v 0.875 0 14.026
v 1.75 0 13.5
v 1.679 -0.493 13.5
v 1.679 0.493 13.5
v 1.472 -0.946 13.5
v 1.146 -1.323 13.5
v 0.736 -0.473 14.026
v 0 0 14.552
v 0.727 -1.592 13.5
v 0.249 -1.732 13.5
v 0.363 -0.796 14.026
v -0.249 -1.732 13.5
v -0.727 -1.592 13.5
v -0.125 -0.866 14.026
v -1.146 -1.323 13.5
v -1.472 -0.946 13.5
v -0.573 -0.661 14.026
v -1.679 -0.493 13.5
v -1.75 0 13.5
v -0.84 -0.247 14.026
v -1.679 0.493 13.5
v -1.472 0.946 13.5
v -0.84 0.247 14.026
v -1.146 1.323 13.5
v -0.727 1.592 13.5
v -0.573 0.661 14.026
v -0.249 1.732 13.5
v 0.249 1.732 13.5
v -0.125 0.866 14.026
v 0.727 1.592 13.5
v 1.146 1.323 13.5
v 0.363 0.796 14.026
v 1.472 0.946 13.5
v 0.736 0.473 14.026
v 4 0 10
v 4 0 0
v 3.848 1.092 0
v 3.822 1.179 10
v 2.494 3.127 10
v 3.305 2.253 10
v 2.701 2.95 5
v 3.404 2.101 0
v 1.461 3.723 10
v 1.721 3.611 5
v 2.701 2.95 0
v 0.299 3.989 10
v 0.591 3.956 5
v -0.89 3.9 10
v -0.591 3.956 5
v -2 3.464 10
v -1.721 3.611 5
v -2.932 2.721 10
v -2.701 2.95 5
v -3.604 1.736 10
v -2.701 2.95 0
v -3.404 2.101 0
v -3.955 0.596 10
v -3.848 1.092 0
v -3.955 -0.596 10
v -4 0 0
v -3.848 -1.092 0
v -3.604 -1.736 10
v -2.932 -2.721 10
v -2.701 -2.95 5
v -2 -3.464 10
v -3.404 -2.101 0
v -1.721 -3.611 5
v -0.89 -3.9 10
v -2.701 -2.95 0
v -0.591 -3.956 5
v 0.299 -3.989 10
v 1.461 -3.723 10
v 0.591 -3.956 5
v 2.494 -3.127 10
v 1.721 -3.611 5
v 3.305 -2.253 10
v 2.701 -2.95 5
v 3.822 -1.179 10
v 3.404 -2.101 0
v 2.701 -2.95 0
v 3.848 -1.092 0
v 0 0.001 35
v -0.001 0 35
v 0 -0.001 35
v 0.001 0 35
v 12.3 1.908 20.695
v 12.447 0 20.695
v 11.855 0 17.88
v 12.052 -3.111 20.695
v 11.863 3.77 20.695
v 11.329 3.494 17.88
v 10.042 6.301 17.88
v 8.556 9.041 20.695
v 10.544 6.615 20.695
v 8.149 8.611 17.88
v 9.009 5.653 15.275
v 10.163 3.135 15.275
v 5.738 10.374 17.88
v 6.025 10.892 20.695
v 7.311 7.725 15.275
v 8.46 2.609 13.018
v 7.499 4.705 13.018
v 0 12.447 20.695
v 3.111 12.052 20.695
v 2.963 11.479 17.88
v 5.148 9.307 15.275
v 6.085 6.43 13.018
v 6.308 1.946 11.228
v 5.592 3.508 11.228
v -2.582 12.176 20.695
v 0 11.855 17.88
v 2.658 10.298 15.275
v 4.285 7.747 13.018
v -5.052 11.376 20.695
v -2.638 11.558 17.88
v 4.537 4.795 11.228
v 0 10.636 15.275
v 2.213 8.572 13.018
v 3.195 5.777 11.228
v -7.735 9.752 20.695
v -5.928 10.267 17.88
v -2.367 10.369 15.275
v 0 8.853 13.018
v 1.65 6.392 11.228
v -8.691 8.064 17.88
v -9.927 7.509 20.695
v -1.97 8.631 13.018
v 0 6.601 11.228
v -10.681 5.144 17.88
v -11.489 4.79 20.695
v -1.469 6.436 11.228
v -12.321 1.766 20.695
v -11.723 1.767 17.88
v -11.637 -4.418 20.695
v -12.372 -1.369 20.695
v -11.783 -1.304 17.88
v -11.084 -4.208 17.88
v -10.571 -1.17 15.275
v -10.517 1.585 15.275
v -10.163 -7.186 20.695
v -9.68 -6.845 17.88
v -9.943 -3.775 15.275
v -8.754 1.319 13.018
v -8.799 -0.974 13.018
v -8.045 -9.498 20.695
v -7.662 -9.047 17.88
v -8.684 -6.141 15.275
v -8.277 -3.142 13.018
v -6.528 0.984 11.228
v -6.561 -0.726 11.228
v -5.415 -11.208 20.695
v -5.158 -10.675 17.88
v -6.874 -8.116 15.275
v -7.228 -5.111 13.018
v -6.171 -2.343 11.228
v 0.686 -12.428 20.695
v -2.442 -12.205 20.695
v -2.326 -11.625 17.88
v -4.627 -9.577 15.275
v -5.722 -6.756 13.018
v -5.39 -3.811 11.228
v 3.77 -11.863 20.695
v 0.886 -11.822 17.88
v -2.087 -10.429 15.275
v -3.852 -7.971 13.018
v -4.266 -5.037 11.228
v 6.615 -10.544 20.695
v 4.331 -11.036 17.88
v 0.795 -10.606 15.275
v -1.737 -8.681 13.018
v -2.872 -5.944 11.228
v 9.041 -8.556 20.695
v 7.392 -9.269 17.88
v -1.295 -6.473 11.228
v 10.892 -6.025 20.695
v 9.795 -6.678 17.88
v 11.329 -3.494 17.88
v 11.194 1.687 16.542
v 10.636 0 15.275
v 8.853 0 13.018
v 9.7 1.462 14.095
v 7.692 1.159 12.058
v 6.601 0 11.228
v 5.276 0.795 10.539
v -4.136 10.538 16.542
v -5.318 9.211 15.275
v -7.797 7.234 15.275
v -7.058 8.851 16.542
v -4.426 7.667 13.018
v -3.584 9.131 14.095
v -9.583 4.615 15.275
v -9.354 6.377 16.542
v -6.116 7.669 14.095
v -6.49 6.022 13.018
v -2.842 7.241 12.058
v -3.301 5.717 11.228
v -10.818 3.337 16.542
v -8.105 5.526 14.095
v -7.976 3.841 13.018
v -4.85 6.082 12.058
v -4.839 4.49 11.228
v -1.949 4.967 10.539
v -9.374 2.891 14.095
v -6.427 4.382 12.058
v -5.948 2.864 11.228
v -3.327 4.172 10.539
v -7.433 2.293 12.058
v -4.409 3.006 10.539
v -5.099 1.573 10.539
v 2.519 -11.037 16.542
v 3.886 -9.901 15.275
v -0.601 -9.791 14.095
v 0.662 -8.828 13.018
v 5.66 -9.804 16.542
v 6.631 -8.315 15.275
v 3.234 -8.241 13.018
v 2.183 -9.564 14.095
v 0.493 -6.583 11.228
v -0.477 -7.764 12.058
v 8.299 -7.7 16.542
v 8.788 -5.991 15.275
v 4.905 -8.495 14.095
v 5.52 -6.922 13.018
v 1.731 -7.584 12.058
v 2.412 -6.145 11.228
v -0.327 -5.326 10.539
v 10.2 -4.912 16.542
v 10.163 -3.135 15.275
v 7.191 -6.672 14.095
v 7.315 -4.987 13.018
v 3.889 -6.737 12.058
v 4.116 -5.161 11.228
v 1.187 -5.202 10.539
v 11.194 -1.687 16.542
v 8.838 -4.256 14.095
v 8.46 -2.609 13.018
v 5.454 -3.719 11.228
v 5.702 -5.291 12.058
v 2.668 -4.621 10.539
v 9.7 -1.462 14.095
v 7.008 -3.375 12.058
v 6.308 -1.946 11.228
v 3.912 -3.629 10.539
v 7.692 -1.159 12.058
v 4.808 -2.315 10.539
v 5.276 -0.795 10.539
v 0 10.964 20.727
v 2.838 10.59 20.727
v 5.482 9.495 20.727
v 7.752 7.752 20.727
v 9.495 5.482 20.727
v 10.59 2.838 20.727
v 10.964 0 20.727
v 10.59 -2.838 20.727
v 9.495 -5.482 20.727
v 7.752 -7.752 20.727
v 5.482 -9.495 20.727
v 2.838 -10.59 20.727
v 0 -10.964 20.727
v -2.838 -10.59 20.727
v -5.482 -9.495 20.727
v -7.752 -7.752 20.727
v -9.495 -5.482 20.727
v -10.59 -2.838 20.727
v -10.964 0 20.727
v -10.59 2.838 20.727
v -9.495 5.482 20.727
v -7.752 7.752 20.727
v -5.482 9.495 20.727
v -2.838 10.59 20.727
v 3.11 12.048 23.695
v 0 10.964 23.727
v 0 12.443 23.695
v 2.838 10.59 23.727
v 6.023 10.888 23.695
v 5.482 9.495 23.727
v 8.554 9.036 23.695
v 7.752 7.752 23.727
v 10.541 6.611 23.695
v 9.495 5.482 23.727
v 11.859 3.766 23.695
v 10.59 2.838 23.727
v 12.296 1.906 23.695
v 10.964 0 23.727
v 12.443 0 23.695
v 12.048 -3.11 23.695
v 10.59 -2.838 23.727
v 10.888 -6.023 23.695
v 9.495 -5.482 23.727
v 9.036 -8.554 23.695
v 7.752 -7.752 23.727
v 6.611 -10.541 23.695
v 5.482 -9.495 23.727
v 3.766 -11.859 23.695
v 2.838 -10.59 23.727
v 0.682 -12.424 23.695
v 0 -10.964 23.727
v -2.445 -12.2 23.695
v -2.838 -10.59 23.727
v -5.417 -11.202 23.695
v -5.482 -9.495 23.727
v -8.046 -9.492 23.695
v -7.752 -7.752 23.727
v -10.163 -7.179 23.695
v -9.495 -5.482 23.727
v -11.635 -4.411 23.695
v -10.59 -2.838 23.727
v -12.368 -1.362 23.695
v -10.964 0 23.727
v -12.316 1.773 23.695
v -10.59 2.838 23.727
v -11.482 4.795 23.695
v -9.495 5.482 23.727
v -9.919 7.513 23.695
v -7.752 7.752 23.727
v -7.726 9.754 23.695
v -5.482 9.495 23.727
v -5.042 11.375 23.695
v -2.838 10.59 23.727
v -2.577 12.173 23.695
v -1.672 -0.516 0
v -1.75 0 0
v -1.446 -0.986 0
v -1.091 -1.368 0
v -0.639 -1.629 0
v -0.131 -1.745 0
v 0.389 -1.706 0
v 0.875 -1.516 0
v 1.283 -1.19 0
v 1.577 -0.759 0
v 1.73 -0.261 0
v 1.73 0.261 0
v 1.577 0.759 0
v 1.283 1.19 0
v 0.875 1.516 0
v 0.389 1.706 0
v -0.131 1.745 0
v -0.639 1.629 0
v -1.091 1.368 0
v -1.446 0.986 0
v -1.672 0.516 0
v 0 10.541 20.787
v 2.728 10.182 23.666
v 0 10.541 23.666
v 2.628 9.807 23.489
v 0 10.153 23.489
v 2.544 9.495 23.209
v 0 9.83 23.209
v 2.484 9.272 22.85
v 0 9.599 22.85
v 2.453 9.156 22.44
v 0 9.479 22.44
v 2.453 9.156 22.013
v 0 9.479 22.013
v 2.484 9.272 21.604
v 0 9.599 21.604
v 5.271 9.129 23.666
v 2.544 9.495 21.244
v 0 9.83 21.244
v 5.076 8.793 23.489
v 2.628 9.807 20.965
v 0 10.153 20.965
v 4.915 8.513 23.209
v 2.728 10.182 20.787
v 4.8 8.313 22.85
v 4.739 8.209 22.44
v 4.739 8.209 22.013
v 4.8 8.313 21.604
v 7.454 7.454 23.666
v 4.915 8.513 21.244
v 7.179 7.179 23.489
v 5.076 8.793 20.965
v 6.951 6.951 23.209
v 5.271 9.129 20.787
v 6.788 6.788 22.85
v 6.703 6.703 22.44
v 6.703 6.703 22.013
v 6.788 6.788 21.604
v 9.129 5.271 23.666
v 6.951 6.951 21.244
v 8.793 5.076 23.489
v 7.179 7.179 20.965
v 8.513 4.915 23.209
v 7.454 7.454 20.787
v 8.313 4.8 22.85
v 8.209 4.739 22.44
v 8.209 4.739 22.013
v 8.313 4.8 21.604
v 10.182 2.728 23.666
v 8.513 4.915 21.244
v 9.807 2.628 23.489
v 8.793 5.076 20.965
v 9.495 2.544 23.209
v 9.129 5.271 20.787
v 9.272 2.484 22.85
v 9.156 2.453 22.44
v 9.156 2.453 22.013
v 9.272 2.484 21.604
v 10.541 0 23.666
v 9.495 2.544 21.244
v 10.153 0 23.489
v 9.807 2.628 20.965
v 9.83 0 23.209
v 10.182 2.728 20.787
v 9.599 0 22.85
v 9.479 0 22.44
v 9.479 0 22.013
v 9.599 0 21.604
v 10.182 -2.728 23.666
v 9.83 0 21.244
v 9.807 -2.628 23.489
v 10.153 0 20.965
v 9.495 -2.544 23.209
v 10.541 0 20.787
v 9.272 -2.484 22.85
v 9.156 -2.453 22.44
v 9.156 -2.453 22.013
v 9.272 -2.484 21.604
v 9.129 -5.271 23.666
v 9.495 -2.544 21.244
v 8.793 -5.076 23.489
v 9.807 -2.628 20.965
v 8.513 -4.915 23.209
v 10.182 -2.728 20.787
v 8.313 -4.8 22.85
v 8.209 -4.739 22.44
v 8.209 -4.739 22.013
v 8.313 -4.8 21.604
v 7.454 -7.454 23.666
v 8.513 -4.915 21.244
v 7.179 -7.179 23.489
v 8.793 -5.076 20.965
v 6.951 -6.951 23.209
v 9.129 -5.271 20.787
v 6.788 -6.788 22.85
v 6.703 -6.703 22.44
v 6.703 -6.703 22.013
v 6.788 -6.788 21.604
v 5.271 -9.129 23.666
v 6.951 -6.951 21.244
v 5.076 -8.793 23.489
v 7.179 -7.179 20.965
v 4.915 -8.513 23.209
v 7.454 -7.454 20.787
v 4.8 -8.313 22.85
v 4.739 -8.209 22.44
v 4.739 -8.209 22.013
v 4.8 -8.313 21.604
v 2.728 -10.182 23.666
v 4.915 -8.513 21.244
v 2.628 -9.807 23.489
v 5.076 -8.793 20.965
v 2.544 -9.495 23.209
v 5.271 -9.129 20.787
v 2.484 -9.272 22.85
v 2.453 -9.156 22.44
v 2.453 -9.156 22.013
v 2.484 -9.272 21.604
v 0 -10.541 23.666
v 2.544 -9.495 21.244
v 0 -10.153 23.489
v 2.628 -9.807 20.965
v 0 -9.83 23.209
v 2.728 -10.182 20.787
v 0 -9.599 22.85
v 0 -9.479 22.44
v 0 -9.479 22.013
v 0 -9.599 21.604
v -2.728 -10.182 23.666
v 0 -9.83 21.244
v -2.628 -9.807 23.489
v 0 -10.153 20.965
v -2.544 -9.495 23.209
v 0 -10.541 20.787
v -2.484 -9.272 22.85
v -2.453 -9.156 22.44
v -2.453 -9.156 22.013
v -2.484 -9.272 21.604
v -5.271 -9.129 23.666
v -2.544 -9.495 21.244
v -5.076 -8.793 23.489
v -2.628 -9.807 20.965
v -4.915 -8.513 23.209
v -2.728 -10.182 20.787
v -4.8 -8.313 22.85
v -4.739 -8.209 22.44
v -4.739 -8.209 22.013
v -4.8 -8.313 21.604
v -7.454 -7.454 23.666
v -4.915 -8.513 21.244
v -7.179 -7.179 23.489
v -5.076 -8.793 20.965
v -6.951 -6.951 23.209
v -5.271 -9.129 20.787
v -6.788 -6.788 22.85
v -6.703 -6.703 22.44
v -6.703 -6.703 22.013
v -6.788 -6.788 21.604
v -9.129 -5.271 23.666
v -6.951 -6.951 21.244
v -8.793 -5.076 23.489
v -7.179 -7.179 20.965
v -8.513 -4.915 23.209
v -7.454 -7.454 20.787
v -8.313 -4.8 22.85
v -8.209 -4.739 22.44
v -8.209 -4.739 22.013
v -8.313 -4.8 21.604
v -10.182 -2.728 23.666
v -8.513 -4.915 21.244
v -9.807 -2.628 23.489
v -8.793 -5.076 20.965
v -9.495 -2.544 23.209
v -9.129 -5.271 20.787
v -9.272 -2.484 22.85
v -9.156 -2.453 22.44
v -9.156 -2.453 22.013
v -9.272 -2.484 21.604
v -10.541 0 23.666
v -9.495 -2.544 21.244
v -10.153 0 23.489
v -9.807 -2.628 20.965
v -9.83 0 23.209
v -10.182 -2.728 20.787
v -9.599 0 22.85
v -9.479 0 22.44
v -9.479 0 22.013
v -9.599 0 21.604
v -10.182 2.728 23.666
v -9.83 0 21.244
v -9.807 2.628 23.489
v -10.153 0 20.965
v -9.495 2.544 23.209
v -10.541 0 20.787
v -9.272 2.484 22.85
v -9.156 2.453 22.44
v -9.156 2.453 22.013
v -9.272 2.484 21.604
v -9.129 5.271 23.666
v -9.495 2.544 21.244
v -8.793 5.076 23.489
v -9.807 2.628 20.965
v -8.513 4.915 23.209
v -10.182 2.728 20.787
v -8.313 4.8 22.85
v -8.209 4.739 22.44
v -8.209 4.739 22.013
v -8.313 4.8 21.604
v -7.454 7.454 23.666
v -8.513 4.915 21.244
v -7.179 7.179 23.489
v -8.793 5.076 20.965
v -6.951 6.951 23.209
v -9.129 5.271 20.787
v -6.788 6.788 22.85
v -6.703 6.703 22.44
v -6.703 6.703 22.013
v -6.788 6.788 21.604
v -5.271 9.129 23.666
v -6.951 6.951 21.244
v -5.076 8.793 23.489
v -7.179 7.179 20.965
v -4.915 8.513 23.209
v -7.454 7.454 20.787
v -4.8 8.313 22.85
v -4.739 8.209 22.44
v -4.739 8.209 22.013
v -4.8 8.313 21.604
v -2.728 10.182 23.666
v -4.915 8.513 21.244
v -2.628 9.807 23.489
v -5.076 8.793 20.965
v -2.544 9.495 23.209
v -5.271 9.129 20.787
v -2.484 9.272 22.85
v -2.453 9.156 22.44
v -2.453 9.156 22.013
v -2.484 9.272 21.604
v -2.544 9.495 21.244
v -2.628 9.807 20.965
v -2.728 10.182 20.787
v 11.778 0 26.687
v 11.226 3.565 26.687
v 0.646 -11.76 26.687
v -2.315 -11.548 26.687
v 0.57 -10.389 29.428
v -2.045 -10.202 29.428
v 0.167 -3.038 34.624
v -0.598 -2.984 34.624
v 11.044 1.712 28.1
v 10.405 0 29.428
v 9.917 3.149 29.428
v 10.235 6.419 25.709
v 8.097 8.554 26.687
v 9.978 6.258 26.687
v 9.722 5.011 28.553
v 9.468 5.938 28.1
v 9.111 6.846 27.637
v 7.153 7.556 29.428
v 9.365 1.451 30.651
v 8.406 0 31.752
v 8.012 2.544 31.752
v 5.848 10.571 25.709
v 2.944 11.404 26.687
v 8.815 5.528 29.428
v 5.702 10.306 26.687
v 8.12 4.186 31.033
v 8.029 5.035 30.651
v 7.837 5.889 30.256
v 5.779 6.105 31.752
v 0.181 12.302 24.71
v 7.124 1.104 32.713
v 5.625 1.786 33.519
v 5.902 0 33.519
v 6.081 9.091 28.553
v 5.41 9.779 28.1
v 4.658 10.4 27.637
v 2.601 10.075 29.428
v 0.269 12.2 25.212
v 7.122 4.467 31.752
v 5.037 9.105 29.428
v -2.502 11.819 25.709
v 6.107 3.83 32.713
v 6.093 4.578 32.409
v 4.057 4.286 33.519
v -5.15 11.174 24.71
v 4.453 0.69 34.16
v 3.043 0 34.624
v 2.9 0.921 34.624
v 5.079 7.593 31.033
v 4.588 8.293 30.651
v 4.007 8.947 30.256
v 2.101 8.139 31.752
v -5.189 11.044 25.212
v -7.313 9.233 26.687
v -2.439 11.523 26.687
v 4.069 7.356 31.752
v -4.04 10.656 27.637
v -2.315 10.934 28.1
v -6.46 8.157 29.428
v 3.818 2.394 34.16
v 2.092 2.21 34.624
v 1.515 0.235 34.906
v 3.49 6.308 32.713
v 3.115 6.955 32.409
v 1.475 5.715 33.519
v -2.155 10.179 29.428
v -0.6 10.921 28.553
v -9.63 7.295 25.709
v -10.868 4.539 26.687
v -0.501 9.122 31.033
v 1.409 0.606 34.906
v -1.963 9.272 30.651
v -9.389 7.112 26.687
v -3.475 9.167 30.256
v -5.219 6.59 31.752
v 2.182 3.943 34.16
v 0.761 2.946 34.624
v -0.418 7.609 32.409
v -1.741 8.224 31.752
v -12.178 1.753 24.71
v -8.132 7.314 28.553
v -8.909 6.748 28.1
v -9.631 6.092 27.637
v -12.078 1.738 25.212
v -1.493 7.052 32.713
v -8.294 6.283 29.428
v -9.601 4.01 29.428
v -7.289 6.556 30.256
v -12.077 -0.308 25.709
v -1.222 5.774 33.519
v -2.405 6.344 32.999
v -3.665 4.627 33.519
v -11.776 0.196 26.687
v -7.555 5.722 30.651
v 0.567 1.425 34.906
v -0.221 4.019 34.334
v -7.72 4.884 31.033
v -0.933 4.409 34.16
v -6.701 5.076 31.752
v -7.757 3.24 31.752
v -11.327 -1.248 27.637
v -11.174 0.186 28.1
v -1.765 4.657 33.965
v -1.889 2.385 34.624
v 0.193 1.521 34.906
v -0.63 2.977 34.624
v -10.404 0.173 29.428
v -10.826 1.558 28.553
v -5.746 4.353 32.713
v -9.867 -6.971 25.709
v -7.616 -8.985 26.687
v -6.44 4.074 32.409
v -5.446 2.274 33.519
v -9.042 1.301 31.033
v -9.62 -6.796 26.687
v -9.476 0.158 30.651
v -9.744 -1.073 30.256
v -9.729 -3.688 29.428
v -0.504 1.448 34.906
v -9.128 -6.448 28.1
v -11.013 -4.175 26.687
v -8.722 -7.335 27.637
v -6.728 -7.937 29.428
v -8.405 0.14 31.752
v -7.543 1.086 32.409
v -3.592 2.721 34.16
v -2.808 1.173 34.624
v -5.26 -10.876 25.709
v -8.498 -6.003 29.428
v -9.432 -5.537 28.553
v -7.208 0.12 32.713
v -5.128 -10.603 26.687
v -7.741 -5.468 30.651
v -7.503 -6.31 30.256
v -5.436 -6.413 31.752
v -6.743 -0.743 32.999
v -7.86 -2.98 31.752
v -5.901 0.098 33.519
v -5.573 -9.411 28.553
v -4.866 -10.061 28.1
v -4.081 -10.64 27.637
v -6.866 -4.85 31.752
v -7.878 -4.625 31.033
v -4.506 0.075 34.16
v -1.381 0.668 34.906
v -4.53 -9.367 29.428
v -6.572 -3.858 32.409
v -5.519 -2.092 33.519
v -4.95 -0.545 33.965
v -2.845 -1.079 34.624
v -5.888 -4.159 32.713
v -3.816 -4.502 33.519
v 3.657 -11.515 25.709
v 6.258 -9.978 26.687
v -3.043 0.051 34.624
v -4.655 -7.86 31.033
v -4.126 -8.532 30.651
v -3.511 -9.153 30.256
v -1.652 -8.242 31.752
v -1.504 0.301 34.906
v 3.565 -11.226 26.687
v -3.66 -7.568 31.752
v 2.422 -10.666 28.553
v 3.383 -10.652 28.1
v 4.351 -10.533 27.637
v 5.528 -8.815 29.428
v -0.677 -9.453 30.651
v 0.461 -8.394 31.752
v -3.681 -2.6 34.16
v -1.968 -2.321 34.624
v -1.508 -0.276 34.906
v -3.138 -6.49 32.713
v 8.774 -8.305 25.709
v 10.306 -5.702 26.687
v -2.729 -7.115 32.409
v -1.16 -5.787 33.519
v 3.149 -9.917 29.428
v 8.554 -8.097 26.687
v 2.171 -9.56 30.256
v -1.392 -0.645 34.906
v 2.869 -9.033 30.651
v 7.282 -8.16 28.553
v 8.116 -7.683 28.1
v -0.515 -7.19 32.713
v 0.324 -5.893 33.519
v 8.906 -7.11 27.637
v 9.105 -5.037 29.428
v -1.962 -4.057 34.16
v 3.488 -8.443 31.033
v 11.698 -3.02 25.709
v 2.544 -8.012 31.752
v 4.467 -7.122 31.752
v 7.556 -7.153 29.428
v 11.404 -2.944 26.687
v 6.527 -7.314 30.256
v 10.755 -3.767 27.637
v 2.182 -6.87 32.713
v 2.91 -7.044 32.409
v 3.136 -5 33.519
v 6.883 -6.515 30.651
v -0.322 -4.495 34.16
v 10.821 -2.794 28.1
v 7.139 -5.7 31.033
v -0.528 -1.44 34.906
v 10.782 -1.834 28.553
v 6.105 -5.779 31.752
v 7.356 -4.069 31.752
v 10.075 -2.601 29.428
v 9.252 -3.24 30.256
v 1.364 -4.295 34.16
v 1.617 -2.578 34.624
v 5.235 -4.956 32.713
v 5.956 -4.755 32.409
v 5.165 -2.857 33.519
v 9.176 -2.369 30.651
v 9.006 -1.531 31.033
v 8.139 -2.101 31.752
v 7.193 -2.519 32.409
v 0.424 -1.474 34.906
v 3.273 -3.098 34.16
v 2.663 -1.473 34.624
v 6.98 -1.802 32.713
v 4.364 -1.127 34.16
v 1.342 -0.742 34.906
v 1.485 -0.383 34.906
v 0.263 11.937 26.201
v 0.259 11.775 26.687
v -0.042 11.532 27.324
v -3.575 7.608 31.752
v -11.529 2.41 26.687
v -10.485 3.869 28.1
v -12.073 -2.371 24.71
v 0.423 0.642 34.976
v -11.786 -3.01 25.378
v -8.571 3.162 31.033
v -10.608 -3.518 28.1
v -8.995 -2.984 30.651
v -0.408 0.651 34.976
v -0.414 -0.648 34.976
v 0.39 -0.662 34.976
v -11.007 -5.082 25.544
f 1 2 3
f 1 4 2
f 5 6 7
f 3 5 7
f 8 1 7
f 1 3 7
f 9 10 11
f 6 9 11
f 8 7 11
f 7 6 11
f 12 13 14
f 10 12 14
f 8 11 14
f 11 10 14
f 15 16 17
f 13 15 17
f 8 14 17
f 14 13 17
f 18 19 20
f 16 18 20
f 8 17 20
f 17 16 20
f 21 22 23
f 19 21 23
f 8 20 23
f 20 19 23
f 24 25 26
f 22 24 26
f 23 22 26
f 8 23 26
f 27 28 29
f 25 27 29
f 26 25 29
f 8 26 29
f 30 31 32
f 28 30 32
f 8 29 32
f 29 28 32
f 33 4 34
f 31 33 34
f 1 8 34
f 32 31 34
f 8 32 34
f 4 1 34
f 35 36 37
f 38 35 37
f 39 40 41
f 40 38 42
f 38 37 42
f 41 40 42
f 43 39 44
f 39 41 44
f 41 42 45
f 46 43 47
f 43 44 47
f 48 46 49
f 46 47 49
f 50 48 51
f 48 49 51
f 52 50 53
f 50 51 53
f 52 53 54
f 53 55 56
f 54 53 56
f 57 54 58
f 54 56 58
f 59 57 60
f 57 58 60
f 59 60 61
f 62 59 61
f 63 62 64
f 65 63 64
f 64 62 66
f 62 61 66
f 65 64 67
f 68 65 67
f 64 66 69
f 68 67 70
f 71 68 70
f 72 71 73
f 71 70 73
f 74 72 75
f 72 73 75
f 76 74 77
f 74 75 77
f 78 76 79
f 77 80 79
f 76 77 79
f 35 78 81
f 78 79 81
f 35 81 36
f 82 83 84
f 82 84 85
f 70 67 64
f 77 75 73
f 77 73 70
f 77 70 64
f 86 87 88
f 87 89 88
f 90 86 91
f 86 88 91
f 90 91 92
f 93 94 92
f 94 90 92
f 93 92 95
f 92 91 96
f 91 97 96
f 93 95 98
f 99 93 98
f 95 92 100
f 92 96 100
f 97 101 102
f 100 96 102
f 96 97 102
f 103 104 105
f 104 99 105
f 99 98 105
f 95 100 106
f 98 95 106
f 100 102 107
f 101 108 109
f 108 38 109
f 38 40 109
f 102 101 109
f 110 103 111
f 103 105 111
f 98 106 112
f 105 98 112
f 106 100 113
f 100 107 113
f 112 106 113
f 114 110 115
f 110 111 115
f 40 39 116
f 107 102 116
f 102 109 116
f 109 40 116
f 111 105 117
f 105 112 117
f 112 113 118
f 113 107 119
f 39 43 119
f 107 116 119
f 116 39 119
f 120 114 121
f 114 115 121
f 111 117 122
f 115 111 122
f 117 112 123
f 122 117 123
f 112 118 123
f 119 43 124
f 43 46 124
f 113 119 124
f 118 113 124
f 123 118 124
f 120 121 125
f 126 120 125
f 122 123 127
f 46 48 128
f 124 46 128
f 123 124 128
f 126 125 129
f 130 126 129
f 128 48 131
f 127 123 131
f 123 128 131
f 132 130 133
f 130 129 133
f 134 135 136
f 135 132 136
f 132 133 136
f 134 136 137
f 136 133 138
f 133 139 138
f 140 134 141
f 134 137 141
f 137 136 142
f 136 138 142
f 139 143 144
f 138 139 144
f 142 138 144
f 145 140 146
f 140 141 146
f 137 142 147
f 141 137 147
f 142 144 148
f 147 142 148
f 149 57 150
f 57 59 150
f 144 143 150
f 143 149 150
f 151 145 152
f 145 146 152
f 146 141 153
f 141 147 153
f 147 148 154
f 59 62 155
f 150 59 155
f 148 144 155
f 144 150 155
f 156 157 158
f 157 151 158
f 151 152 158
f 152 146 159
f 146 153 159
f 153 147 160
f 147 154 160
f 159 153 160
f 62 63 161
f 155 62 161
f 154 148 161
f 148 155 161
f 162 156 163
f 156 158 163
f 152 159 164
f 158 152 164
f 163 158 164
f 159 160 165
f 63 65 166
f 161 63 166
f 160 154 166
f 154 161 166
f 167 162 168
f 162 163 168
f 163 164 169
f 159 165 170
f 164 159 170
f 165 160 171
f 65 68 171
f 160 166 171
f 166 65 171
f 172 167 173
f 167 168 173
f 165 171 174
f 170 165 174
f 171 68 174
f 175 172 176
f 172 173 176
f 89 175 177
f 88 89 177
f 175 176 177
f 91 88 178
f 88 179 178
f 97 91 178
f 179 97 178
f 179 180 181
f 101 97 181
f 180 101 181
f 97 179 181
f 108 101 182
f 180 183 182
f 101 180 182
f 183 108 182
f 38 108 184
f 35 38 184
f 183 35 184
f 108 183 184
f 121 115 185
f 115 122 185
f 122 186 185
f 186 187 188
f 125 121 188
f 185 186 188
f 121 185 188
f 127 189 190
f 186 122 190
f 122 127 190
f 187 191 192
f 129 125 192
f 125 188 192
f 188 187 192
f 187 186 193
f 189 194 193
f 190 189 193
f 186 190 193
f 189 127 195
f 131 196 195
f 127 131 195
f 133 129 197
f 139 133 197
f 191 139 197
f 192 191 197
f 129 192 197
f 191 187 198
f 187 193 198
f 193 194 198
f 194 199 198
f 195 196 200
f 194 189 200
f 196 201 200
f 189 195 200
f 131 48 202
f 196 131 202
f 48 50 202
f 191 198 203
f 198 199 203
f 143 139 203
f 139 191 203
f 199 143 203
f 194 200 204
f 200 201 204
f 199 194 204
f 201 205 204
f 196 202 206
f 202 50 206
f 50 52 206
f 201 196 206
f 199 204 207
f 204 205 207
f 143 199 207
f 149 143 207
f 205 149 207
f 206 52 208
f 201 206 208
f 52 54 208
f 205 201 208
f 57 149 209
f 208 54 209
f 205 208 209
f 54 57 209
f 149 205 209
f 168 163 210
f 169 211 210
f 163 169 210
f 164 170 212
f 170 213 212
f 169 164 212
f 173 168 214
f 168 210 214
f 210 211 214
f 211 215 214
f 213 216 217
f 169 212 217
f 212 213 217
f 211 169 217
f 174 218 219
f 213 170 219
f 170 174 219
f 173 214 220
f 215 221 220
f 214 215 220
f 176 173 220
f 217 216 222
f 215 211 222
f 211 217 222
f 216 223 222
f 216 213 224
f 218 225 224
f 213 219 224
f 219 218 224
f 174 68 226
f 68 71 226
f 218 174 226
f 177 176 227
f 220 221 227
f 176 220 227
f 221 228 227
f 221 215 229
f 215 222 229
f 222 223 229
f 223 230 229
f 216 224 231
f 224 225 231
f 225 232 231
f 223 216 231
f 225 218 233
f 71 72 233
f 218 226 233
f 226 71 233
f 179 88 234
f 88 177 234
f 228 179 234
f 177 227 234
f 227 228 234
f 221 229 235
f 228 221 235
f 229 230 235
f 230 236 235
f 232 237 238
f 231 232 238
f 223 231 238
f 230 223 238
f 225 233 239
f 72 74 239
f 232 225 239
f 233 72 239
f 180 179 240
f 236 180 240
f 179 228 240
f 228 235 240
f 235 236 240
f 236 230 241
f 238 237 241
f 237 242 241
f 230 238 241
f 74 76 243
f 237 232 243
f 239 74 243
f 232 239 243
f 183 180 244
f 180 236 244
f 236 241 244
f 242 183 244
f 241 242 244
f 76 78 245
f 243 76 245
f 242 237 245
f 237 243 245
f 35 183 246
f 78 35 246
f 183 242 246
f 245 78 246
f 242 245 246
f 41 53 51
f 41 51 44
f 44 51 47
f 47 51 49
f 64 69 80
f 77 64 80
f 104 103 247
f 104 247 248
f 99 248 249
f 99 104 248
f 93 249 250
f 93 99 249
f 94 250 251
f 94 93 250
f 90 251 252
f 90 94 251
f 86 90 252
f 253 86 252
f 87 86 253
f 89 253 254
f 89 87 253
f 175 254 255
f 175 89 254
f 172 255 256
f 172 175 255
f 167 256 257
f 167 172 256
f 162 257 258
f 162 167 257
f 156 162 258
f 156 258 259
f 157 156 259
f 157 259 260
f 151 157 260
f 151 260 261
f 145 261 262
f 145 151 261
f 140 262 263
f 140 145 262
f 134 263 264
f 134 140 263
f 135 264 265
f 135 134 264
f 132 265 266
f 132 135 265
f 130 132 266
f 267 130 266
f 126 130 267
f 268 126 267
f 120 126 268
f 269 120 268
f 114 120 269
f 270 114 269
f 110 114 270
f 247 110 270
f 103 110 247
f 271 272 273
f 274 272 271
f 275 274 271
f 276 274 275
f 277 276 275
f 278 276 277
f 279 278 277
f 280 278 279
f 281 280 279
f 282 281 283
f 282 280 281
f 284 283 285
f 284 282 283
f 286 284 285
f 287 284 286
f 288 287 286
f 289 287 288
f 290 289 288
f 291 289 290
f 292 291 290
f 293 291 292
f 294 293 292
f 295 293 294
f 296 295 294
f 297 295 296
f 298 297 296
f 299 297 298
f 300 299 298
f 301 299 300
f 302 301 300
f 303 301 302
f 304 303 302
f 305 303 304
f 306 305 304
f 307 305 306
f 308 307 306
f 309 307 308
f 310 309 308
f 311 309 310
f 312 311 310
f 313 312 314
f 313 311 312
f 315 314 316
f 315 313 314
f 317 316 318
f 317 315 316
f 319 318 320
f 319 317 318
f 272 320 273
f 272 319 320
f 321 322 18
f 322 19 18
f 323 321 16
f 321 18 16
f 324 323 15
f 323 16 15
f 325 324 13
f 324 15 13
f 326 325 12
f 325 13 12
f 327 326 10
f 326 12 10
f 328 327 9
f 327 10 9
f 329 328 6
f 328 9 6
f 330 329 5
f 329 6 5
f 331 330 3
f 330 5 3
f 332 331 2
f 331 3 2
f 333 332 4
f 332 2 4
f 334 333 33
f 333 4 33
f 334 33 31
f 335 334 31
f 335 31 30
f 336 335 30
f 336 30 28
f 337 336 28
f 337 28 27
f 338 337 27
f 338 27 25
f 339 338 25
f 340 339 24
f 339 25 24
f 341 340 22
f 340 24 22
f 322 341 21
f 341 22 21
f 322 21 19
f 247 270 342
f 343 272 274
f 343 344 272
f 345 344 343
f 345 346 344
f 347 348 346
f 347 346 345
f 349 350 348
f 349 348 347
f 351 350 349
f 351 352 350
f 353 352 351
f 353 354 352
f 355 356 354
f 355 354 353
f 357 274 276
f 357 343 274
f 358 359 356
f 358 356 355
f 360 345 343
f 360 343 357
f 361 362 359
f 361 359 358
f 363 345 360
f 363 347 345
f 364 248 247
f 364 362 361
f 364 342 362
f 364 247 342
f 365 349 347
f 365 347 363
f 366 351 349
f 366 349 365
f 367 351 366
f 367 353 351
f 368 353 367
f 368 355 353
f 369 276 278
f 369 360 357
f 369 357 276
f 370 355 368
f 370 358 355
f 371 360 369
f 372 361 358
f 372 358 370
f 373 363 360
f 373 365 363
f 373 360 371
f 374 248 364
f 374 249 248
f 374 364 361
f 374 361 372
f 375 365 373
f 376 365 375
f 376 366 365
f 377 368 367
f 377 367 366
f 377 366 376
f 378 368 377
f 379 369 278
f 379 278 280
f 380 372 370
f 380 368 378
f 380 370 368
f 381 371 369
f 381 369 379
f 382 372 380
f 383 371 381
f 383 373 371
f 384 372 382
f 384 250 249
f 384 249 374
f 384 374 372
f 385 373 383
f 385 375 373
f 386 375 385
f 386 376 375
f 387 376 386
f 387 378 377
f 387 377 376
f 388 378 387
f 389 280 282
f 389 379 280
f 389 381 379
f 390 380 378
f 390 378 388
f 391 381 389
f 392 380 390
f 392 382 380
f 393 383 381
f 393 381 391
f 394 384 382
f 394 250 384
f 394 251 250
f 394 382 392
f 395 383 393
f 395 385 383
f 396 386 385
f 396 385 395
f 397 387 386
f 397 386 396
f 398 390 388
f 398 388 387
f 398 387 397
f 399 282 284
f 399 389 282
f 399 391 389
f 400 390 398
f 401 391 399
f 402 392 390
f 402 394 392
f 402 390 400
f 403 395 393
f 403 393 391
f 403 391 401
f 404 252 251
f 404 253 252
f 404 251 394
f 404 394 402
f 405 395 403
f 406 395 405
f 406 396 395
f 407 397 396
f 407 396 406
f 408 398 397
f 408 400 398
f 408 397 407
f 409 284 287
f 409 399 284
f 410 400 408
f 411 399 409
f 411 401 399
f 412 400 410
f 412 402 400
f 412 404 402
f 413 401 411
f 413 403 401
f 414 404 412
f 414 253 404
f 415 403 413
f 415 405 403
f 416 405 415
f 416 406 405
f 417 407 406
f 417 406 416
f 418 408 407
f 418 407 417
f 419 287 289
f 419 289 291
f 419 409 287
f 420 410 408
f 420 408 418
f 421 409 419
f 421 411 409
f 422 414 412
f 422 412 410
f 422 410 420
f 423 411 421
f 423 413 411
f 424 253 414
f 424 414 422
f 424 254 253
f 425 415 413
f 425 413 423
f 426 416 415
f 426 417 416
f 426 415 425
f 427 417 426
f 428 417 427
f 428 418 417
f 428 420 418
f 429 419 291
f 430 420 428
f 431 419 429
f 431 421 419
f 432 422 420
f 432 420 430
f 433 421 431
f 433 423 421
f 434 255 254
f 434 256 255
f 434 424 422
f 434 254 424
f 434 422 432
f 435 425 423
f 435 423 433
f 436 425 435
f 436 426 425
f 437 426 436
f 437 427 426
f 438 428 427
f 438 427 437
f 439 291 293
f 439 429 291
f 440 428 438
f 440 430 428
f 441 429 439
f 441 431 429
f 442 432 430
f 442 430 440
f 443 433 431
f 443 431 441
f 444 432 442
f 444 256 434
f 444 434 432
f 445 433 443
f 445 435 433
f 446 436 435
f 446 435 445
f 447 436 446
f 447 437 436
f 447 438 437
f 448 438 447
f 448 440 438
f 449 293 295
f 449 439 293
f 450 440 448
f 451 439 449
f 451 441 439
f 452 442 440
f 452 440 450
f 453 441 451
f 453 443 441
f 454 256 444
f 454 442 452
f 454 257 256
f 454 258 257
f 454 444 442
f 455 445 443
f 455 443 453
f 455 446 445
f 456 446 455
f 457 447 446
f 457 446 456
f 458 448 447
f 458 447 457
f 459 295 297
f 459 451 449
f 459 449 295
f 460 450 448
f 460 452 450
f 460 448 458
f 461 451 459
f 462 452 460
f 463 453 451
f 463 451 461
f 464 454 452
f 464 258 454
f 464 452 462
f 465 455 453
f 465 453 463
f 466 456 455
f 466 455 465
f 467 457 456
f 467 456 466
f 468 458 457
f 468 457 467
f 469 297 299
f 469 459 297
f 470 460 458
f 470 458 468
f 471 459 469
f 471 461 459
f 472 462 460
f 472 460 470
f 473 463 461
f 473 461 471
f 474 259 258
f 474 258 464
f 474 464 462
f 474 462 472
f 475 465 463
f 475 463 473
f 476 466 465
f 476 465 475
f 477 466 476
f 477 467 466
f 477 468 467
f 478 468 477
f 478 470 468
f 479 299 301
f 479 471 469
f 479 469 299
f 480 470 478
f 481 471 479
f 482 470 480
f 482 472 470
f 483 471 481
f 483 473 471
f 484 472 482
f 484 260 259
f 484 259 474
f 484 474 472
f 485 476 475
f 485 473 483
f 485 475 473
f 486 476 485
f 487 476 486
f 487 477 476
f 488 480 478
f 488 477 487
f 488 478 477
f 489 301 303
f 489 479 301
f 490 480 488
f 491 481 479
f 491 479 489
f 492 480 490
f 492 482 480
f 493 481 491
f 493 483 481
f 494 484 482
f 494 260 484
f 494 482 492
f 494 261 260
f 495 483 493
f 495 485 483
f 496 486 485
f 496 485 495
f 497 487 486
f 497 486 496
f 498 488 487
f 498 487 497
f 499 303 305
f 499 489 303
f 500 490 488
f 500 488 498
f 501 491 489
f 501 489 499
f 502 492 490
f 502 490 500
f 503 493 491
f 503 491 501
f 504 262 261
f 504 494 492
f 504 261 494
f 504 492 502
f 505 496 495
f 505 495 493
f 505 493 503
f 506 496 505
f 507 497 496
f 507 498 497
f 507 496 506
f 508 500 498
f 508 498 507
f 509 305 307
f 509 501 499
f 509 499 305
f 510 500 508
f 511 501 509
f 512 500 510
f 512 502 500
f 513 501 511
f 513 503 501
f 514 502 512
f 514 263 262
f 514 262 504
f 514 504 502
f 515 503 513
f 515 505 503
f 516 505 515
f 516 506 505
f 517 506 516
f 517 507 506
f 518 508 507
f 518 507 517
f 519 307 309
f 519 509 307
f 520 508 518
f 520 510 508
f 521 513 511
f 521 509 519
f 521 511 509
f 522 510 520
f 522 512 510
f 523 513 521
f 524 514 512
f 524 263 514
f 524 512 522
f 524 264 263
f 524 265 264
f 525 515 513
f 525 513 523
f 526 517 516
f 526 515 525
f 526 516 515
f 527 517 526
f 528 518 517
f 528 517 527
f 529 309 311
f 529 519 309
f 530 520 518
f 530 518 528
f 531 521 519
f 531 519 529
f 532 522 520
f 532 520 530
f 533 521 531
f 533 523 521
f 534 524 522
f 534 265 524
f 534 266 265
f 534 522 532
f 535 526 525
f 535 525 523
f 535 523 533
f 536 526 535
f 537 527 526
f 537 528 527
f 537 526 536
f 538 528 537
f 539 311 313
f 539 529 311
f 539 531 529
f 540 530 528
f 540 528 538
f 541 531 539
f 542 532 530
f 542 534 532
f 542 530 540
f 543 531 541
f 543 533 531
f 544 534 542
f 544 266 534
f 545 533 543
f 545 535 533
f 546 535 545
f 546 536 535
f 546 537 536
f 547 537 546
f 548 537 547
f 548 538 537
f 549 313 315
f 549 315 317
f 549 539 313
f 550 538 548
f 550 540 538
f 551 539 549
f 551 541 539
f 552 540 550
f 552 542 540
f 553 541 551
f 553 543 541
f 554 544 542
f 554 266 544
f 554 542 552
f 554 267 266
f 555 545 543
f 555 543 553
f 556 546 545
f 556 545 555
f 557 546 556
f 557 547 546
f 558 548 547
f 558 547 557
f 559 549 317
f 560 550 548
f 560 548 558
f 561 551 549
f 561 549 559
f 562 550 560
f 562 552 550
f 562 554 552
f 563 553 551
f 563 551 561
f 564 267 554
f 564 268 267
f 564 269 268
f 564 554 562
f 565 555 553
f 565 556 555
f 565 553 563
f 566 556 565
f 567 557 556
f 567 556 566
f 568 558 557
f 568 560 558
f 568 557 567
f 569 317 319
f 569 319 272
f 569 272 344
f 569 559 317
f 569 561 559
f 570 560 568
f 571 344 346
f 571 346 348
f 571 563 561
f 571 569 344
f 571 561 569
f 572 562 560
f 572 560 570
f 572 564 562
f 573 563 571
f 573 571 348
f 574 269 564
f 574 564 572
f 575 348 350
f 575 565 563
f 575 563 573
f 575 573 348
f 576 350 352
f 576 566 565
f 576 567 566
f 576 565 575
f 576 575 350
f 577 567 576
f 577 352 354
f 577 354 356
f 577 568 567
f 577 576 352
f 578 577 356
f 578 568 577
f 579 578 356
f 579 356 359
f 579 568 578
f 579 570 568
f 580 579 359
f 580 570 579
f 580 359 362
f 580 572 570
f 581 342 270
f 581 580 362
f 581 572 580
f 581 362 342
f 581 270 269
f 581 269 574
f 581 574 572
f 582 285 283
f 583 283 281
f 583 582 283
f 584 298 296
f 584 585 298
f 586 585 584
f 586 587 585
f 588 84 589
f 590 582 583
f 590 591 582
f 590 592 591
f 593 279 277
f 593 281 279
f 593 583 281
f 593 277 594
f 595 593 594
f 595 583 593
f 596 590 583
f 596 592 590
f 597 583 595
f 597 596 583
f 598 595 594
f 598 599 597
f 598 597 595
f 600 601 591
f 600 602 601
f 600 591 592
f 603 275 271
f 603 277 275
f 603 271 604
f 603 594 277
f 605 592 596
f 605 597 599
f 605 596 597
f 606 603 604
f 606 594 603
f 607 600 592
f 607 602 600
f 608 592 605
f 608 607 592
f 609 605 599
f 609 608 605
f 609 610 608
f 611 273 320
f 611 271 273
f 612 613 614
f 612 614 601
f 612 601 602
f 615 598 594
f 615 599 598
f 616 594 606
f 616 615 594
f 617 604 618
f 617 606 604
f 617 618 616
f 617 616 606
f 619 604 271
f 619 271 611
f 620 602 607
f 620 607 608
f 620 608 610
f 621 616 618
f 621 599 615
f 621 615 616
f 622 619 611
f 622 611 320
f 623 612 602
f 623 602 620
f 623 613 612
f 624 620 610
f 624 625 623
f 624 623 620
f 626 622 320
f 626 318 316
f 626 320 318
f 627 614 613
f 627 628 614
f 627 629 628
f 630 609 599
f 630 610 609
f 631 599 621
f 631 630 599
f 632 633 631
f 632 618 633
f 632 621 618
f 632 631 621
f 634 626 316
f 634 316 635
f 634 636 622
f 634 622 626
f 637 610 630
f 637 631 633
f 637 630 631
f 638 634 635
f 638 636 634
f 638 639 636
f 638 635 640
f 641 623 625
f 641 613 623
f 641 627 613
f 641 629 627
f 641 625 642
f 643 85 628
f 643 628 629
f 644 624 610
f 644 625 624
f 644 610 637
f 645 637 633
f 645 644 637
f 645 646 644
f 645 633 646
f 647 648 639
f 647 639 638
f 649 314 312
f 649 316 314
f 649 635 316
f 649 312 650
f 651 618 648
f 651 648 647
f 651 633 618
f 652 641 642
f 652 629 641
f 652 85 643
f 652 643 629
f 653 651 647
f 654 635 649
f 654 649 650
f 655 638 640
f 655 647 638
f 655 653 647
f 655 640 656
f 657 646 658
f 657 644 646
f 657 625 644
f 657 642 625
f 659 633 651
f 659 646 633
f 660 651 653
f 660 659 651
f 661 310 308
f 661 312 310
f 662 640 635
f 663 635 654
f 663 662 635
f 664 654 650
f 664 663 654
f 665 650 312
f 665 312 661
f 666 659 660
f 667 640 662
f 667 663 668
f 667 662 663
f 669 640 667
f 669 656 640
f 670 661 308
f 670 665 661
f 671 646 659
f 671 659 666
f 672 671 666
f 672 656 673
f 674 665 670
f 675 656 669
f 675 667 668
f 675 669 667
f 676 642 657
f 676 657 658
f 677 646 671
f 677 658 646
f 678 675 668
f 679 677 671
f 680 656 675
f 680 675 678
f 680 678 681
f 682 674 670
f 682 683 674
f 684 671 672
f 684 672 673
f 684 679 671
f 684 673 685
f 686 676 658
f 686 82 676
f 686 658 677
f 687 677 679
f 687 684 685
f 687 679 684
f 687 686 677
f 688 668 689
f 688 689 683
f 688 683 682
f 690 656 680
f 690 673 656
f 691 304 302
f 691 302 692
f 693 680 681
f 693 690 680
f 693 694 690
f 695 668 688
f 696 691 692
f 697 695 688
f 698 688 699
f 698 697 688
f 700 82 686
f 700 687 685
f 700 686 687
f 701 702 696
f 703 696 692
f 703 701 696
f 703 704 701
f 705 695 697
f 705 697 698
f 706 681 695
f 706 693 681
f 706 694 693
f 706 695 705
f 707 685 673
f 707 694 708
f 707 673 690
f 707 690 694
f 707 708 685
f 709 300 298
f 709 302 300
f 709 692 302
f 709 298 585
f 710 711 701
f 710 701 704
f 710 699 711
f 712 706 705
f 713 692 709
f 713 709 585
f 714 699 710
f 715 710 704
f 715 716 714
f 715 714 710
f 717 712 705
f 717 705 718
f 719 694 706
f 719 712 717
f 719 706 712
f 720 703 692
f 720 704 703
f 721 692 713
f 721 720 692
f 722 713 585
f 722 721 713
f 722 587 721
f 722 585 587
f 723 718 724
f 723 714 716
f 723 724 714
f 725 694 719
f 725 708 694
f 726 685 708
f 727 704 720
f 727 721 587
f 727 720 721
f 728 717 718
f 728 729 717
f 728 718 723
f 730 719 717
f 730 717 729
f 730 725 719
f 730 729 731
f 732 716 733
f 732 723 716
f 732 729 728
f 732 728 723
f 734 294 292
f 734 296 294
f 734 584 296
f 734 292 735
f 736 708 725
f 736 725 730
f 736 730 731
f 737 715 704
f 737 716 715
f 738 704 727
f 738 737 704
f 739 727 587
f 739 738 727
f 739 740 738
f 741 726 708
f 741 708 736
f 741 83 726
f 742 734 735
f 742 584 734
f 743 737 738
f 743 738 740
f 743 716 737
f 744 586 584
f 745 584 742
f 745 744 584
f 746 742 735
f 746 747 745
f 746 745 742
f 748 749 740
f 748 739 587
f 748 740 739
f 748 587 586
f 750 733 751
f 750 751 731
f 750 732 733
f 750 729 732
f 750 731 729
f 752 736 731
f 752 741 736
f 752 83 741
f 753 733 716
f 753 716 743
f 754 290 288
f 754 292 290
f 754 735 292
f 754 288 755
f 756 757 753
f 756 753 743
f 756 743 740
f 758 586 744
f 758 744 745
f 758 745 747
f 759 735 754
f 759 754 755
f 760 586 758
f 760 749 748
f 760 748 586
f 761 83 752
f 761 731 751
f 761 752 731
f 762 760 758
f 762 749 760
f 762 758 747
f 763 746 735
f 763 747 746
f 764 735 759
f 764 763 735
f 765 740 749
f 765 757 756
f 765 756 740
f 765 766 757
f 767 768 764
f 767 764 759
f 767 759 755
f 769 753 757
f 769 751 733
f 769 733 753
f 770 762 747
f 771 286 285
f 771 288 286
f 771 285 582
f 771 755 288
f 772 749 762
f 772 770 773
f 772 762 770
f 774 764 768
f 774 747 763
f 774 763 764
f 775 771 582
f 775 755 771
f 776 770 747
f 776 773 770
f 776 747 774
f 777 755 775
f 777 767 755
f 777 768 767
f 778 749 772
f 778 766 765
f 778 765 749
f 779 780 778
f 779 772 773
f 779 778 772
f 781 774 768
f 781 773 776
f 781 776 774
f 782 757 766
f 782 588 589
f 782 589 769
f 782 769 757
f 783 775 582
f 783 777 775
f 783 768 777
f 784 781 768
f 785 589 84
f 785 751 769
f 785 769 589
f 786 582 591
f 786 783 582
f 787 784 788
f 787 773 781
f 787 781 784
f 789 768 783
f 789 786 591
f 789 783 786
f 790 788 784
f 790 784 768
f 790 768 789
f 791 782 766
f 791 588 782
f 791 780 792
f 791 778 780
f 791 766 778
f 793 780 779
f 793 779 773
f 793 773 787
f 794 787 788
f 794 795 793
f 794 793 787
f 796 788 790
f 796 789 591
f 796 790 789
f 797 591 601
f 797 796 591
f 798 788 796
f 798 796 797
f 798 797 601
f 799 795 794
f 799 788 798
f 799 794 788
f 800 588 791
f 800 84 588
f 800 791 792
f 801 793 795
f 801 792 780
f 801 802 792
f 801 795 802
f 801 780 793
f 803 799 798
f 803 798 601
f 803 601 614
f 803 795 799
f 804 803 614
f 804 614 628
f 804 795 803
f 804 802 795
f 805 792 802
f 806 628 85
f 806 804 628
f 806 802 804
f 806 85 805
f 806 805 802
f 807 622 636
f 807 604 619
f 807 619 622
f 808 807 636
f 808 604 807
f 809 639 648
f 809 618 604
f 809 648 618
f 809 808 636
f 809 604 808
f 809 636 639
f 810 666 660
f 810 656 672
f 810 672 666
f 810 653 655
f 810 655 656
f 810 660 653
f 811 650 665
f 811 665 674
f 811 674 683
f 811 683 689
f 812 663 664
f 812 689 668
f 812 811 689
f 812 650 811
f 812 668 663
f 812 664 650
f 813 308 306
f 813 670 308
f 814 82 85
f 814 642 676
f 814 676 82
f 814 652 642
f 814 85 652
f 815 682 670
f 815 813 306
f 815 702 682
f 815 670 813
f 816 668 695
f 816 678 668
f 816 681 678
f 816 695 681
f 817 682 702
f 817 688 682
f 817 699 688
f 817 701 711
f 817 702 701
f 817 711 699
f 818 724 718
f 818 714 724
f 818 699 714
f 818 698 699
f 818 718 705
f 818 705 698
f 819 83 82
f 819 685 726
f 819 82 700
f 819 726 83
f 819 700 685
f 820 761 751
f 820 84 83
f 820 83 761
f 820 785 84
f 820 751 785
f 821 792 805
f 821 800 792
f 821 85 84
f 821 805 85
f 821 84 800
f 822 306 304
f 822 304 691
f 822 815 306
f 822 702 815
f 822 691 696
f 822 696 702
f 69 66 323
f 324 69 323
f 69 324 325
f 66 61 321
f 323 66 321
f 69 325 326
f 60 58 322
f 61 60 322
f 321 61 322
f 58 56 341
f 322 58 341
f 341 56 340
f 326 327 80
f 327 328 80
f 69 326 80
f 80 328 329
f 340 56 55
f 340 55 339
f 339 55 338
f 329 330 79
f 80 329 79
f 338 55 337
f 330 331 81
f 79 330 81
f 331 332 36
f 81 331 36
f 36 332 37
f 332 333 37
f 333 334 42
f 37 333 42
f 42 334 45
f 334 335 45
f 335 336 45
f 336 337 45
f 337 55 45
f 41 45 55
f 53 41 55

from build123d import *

# Parameters (mm, degrees)
F0_R      = 4
F1_DEPTH  = 10
F2_R      = 12.5
F3_DEPTH  = 25
F9_D      = 3.5
F9_DEPTH  = 13.5
F9_TIP    = 1.0515060833
F10_DEPTH = 5


# Not quite as in the source:
# - a fillet or chamfer that OpenCascade refuses, or shapes differently, is made with other operations: its cross-section is extruded or revolved along the edge and cut away or added


with BuildPart() as f1:
    # F0 (on Top) → F1 (new body)
    with BuildSketch(Plane.XY):
        Circle(F0_R)
    extrude(amount=F1_DEPTH)

    # F2 (on face) → F3 (join)
    with BuildSketch(Plane.XY.offset(10)):
        Circle(F2_R)
    extrude(amount=F3_DEPTH)

    # F4: fillet of radius 12.499 on 2 edges, made by hand

    # F4_s1 → F4_t2 (revolve, cut)
    with BuildSketch(Plane.XZ):
        with BuildLine():
            ThreePointArc((12.5, 22.501), (8.8391276581, 31.3391276581), (0.001, 35))
            Line((0.001, 35), (12.5, 35))
            Line((12.5, 35), (12.5, 22.501))
        make_face()
    revolve(axis=Axis((0, 0, 35), (0, 0, 1)), mode=Mode.SUBTRACT)

    # F4_s3 → F4_t4 (revolve, cut)
    with BuildSketch(Plane.XZ):
        with BuildLine():
            ThreePointArc((12.5, 21.84200152), (10.1550263443, 14.5536032049), (4, 10))
            Line((4, 10), (12.5, 10))
            Line((12.5, 10), (12.5, 21.84200152))
        make_face()
    revolve(axis=Axis((0, 0, 10), (0, 0, 1)), mode=Mode.SUBTRACT)

    # F5 (on Right) → F6 (revolve, cut)
    with BuildSketch(Plane.YZ):
        with BuildLine():
            Line((12.5007824972, 23.6938826144), (10.963675566, 23.7266744822))
            ThreePointArc((10.963675566, 23.7266744822), (9.463675566, 22.2266744822), (10.963675566, 20.7266744822))
            Line((10.963675566, 20.7266744822), (12.5007824972, 20.6938826144))
            Line((12.5007824972, 20.6938826144), (12.5007824972, 23.6938826144))
        make_face()
    revolve(axis=Axis((0, 0, 10), (0, 0, -1)), mode=Mode.SUBTRACT)

    # F9
    with Locations(Plane(origin=(0, 0, 0), x_dir=(1, 0, 0), z_dir=(0, 0, -1))):
        with Locations((0, 0)):
            Hole(F9_D / 2, depth=F9_DEPTH)
            with Locations((0, 0, -(F9_DEPTH + F9_TIP / 2))):  # 118° drill point
                Cone(0, F9_D / 2, F9_TIP, mode=Mode.SUBTRACT)

    # F7 (on face) → F10 (cut)
    with BuildSketch(Plane(origin=(0, 0, 0), x_dir=(1, 0, 0), z_dir=(0, 0, -1))):
        with BuildLine():
            ThreePointArc((-2.7013885318, -2.95), (0, -4), (2.7013885318, -2.95))
            Line((2.7013885318, -2.95), (-2.7013885318, -2.95))
        make_face()
        with BuildLine():
            Line((-2.7013885318, 2.95), (2.7013885318, 2.95))
            ThreePointArc((2.7013885318, 2.95), (0, 4), (-2.7013885318, 2.95))
        make_face()
    extrude(amount=-F10_DEPTH, mode=Mode.SUBTRACT)


solid = f1.part
